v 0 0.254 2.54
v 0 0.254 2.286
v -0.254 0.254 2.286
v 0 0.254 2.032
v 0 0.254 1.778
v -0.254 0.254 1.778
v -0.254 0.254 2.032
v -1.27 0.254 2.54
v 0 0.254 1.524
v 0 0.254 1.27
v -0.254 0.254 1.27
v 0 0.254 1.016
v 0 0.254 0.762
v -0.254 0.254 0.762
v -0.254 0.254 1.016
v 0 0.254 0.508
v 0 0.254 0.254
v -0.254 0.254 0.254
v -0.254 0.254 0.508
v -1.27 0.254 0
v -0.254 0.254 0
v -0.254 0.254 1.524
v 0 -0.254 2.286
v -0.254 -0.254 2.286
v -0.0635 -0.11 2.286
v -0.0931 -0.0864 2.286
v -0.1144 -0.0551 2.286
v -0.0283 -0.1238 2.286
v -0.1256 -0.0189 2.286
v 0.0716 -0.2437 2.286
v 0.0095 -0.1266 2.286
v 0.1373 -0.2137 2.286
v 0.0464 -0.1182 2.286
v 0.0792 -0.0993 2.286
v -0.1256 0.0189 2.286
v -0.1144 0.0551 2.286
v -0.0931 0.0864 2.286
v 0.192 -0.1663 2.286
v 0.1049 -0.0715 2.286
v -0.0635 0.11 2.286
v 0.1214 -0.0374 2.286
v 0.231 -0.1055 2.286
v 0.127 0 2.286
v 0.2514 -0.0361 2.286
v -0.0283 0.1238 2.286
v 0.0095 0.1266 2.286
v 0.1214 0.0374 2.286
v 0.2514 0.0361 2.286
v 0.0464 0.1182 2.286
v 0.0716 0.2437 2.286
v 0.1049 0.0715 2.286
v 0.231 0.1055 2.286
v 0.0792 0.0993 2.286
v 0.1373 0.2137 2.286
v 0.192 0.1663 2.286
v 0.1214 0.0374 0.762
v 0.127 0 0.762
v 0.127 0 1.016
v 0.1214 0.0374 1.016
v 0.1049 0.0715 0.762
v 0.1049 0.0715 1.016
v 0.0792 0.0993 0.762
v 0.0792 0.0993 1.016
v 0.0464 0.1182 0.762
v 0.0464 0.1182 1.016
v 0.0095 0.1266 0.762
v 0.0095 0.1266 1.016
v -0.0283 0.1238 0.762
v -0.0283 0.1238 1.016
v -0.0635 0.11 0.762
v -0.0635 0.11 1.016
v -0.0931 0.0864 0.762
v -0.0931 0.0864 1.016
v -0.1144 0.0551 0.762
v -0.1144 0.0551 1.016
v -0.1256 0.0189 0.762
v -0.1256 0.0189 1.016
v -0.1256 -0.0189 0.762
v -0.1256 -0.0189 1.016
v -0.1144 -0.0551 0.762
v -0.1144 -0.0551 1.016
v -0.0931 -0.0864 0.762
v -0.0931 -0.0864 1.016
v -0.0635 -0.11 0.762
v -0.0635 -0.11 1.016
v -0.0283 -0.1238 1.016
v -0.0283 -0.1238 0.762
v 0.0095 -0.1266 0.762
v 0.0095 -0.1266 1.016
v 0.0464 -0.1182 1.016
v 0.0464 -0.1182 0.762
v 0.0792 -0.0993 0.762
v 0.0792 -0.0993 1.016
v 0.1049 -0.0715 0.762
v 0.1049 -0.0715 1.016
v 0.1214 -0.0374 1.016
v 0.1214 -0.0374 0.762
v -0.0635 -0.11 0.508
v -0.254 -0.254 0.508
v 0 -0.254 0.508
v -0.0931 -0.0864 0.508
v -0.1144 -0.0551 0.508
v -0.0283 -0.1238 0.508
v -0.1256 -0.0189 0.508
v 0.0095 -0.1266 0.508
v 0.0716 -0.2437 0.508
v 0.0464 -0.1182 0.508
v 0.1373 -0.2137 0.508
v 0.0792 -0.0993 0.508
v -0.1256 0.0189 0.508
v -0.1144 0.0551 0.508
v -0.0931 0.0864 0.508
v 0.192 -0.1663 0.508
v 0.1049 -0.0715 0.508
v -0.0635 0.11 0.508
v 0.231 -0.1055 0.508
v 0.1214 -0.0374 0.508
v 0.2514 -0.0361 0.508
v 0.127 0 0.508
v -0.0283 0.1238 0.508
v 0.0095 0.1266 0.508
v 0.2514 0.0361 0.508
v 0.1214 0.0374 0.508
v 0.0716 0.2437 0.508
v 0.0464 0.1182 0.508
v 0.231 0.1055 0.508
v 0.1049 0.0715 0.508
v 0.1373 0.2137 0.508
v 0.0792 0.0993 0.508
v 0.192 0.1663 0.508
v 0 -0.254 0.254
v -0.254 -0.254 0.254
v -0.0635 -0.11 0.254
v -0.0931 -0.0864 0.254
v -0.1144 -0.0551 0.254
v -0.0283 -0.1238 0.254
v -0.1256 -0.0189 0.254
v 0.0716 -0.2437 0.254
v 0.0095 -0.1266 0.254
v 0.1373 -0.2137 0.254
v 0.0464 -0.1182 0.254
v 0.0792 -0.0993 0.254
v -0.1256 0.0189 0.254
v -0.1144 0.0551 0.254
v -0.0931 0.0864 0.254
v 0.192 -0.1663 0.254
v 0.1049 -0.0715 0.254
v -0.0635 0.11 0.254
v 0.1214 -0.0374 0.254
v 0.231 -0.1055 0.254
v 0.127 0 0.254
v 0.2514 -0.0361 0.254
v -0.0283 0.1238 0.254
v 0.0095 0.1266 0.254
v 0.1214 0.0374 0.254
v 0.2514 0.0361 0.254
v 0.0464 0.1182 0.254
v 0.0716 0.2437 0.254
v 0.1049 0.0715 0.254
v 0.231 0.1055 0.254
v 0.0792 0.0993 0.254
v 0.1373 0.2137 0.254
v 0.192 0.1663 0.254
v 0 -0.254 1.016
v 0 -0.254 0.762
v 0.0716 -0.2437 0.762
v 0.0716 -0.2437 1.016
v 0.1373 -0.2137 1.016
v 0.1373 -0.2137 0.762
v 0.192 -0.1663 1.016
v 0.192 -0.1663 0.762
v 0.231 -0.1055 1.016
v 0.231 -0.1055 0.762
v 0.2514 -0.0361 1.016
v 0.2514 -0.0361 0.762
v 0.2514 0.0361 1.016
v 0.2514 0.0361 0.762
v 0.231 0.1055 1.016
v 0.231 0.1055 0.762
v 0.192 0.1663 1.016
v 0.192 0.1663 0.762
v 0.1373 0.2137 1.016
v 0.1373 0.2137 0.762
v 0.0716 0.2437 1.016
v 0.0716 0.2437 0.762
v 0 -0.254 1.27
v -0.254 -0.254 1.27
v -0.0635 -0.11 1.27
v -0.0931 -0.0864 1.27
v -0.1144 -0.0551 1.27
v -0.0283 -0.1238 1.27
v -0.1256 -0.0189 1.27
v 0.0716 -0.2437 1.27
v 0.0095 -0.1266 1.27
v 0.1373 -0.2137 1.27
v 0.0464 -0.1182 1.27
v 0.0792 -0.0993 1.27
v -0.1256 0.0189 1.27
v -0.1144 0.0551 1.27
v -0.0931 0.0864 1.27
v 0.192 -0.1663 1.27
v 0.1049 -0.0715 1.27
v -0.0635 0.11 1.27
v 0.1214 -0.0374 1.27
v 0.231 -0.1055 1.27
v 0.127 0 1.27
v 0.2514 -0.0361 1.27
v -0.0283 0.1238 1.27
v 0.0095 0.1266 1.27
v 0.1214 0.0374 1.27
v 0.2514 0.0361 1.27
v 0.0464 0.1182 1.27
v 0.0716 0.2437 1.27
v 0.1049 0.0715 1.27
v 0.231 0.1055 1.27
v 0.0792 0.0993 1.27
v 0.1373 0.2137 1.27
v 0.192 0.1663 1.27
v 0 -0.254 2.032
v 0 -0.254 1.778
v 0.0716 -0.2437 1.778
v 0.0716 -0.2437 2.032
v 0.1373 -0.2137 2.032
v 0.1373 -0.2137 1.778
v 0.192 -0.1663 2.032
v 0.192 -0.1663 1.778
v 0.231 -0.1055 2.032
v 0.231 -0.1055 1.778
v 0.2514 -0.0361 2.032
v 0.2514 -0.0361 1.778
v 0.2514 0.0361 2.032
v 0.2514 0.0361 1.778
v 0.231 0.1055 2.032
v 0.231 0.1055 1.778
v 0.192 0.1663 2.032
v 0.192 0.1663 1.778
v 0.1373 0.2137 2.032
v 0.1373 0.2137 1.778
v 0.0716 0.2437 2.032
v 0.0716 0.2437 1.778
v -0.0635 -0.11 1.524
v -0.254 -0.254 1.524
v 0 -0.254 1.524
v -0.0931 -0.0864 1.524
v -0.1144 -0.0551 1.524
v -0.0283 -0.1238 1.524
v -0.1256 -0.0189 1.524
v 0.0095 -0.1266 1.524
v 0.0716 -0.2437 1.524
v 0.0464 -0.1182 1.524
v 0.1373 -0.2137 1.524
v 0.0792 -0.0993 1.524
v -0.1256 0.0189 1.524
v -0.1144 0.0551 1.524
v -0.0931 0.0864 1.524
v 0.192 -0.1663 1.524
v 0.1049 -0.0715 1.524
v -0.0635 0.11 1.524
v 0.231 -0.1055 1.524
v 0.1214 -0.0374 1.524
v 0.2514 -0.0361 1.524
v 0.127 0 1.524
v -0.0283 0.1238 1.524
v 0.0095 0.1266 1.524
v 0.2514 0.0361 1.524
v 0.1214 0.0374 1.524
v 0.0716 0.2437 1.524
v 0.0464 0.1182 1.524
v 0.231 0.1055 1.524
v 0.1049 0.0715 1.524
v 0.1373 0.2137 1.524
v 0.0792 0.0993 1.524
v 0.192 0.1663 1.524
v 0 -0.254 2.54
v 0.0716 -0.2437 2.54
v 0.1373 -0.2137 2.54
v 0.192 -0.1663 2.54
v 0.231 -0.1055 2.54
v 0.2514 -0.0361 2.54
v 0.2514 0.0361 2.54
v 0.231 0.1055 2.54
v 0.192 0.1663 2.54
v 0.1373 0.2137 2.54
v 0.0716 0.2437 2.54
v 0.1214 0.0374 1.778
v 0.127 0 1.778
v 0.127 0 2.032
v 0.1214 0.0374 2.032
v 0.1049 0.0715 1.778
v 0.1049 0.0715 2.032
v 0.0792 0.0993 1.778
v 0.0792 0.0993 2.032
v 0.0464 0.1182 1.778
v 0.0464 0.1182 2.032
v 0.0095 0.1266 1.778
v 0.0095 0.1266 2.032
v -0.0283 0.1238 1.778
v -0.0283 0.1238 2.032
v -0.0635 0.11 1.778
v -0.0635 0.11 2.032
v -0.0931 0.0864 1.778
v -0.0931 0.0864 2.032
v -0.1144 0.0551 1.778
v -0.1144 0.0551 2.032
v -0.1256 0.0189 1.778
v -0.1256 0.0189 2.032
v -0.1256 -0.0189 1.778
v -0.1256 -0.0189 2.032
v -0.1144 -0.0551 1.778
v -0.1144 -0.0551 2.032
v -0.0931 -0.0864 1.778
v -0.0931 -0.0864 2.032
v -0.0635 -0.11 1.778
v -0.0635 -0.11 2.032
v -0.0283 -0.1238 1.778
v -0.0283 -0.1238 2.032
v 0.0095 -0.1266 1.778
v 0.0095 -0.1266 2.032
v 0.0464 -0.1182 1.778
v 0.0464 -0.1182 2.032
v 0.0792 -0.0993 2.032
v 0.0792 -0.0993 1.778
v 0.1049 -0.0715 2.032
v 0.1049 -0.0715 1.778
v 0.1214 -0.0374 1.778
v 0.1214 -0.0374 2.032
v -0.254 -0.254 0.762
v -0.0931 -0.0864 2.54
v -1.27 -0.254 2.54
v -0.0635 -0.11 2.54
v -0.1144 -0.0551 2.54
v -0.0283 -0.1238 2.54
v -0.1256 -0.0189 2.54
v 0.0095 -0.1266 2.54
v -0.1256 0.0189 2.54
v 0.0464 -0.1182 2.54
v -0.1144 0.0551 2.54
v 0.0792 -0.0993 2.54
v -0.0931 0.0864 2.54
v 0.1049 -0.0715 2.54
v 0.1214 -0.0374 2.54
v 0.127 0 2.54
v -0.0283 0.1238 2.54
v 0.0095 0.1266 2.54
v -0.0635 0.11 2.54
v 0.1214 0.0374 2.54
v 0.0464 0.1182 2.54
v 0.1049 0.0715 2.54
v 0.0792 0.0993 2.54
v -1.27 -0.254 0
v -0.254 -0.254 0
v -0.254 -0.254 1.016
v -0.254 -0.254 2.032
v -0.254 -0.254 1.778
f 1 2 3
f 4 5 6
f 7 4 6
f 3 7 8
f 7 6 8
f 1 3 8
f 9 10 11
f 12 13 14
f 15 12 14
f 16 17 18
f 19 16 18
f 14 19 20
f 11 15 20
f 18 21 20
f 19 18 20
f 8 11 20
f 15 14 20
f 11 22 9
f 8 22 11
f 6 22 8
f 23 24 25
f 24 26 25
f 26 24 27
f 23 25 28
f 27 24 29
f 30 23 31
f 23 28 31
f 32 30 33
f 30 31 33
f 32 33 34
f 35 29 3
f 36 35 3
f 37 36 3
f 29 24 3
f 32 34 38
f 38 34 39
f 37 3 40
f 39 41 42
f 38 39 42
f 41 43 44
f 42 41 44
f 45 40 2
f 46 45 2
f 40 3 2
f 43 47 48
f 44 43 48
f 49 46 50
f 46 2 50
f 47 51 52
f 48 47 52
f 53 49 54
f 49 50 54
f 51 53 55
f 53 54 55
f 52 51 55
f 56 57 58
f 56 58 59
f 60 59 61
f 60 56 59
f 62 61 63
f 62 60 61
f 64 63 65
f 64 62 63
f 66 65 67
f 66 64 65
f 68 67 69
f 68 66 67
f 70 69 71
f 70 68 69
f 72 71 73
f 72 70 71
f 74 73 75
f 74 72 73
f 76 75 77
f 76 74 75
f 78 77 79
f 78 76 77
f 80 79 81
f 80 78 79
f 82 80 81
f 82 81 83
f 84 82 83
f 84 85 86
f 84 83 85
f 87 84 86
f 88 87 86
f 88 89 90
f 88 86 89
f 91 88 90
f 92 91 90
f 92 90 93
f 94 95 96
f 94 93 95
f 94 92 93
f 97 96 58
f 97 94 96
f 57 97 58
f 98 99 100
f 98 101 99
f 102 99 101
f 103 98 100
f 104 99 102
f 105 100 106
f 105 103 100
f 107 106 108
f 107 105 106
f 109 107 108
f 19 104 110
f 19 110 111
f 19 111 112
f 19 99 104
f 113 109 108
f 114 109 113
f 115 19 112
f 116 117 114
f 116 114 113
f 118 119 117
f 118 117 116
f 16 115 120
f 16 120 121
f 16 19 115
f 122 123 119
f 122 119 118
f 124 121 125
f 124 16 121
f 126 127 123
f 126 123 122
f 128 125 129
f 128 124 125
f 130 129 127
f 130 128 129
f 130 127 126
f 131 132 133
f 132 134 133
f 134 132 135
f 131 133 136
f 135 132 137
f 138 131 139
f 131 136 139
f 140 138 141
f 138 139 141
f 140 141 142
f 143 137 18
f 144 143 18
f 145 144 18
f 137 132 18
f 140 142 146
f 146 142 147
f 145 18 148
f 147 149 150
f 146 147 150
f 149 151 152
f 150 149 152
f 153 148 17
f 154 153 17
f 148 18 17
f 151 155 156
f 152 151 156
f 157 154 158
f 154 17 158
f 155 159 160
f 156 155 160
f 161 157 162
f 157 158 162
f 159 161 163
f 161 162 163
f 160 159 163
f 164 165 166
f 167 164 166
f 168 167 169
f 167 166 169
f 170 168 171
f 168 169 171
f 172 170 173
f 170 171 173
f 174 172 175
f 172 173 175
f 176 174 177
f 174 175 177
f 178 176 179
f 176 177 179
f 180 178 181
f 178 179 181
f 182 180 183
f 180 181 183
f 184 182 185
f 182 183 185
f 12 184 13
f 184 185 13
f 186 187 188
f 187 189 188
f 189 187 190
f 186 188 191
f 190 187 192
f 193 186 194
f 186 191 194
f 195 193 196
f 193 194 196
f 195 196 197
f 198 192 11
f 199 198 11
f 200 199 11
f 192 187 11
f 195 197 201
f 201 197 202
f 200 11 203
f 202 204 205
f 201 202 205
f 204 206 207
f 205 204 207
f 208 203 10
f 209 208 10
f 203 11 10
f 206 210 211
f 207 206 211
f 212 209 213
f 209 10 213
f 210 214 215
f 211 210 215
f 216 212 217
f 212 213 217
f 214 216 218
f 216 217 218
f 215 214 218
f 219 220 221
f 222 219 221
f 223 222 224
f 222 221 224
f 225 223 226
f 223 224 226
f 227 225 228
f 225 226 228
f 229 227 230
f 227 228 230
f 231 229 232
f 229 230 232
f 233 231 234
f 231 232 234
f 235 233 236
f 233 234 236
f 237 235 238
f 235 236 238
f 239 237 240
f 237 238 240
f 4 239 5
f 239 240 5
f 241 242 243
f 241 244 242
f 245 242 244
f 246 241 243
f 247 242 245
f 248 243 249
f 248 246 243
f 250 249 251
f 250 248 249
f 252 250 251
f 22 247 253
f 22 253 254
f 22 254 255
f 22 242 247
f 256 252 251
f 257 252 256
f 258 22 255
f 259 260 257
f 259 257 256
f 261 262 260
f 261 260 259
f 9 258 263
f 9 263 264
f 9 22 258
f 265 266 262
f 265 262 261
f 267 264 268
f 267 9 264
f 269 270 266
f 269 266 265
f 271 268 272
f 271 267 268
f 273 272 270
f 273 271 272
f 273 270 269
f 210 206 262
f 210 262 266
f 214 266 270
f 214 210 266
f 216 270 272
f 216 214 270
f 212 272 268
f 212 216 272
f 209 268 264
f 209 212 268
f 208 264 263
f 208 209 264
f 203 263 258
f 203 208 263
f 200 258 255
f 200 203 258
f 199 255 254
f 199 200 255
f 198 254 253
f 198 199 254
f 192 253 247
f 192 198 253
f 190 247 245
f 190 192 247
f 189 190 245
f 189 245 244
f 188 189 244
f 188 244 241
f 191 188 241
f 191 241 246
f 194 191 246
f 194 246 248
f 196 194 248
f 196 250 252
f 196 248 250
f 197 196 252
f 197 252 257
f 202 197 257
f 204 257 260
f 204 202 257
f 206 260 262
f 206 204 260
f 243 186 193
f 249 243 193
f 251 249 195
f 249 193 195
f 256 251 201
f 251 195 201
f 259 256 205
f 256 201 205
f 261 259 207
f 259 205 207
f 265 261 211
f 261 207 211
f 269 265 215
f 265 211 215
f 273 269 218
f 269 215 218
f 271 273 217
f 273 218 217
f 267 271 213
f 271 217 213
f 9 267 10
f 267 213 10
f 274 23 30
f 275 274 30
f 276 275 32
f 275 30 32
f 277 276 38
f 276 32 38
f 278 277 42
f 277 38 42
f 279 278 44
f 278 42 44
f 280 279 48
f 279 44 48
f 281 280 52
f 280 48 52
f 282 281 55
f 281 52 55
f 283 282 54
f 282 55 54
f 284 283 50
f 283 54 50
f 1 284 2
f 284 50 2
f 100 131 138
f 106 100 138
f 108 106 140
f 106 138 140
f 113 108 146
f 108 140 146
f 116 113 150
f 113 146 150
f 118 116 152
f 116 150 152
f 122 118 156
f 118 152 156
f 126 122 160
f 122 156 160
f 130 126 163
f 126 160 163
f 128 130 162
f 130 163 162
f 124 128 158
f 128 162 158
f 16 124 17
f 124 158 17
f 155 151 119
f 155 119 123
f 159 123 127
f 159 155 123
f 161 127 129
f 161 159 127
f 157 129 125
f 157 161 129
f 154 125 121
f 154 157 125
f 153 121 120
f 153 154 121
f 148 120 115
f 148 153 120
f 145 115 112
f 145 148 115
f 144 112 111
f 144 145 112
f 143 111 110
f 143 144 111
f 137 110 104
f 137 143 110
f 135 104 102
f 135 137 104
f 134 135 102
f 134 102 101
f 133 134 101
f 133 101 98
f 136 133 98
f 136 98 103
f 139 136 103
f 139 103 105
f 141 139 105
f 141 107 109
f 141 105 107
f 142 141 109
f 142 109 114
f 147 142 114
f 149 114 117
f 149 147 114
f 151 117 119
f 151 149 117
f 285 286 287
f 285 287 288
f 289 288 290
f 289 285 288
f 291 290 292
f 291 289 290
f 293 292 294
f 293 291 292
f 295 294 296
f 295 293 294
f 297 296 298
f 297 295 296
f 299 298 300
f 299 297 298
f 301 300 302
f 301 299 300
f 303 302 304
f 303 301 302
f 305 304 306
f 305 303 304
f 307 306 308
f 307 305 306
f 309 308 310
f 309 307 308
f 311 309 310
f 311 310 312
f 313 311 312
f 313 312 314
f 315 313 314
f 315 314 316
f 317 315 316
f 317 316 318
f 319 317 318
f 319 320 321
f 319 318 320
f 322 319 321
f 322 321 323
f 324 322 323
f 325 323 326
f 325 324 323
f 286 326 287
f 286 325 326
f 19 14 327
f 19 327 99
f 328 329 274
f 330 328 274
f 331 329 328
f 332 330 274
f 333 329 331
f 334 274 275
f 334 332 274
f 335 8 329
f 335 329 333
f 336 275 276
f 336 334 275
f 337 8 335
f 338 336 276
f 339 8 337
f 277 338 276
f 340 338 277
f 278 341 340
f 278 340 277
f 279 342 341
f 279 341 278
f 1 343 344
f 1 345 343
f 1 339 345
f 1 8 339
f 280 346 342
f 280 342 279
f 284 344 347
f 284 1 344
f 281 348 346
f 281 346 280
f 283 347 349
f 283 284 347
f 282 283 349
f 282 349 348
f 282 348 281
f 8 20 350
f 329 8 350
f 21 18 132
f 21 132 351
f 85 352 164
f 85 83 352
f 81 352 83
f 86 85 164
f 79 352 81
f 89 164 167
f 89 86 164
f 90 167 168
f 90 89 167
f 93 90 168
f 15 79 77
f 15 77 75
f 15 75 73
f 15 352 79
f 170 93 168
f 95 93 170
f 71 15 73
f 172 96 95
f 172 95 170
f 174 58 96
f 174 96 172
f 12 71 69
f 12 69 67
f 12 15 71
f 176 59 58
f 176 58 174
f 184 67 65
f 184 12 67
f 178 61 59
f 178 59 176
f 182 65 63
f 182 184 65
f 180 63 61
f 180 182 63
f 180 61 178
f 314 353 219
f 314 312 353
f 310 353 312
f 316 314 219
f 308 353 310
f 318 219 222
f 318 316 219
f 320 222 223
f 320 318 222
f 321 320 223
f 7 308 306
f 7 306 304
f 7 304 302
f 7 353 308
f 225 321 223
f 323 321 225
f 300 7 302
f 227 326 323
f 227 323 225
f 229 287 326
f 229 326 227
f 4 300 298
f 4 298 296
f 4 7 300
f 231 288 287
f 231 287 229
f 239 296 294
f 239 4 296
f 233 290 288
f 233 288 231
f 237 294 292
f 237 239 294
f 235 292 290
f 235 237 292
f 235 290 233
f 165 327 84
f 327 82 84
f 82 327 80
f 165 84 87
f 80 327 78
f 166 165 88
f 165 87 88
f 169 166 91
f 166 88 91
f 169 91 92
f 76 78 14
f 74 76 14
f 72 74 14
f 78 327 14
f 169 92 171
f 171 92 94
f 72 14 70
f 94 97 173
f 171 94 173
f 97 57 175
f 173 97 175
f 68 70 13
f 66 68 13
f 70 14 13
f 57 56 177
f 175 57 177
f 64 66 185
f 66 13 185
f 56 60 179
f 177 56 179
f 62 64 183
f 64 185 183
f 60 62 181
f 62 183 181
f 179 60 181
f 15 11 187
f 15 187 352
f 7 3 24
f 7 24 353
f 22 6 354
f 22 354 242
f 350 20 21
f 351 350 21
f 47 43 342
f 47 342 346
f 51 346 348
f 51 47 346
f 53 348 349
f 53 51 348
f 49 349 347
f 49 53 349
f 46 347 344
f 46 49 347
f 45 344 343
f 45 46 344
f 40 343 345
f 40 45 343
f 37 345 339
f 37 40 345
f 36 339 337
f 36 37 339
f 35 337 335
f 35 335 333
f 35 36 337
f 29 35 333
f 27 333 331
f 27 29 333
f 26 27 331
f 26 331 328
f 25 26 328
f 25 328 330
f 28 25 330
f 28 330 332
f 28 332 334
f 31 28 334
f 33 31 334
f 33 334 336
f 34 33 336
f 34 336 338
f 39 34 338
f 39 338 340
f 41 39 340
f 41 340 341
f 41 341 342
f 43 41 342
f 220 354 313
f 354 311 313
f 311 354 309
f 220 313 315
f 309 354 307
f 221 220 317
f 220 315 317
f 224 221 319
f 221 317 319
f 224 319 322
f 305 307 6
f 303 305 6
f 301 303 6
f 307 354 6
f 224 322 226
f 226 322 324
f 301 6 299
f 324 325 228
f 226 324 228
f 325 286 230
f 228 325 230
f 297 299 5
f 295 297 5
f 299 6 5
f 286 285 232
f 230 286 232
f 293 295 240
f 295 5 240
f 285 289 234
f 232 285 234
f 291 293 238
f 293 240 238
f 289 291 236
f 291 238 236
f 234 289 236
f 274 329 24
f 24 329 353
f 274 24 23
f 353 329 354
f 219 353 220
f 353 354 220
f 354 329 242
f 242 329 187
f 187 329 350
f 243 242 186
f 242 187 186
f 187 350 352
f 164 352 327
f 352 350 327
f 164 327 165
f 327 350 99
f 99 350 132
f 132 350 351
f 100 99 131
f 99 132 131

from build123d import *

# Parameters (mm, degrees)
SKETCH1_R           = 0.127
BOSS_EXTRUDE1_DEPTH = 2.54
SKETCH2_W           = 0.508
SKETCH2_H           = 0.254
CUT_EXTRUDE1_DEPTH  = 1.508


with BuildPart() as part:
    # Sketch1 → Boss-Extrude1 (new body)
    with BuildSketch(Plane.XY):
        with BuildLine():
            Line((0, 0.254), (-1.27, 0.254))
            Line((-1.27, 0.254), (-1.27, -0.254))
            Line((-1.27, -0.254), (0, -0.254))
            ThreePointArc((0, -0.254), (0.254, 0), (0, 0.254))
        make_face()
        Circle(SKETCH1_R, mode=Mode.SUBTRACT)
    extrude(amount=BOSS_EXTRUDE1_DEPTH)

    # Sketch2 → Cut-Extrude1 (cut, through all)
    with BuildSketch(Plane(origin=(0, 0.254, 0), x_dir=(1, 0, 0), z_dir=(0, 1, 0))):
        with Locations((0, -0.127)):
            Rectangle(SKETCH2_W, SKETCH2_H)
        with Locations((0, -0.635)):
            Rectangle(SKETCH2_W, SKETCH2_H)
        with Locations((0, -1.143)):
            Rectangle(SKETCH2_W, SKETCH2_H)
        with Locations((0, -1.651)):
            Rectangle(SKETCH2_W, SKETCH2_H)
        with Locations((0, -2.159)):
            Rectangle(SKETCH2_W, SKETCH2_H)
    extrude(amount=-CUT_EXTRUDE1_DEPTH, mode=Mode.SUBTRACT)


solid = part.part
